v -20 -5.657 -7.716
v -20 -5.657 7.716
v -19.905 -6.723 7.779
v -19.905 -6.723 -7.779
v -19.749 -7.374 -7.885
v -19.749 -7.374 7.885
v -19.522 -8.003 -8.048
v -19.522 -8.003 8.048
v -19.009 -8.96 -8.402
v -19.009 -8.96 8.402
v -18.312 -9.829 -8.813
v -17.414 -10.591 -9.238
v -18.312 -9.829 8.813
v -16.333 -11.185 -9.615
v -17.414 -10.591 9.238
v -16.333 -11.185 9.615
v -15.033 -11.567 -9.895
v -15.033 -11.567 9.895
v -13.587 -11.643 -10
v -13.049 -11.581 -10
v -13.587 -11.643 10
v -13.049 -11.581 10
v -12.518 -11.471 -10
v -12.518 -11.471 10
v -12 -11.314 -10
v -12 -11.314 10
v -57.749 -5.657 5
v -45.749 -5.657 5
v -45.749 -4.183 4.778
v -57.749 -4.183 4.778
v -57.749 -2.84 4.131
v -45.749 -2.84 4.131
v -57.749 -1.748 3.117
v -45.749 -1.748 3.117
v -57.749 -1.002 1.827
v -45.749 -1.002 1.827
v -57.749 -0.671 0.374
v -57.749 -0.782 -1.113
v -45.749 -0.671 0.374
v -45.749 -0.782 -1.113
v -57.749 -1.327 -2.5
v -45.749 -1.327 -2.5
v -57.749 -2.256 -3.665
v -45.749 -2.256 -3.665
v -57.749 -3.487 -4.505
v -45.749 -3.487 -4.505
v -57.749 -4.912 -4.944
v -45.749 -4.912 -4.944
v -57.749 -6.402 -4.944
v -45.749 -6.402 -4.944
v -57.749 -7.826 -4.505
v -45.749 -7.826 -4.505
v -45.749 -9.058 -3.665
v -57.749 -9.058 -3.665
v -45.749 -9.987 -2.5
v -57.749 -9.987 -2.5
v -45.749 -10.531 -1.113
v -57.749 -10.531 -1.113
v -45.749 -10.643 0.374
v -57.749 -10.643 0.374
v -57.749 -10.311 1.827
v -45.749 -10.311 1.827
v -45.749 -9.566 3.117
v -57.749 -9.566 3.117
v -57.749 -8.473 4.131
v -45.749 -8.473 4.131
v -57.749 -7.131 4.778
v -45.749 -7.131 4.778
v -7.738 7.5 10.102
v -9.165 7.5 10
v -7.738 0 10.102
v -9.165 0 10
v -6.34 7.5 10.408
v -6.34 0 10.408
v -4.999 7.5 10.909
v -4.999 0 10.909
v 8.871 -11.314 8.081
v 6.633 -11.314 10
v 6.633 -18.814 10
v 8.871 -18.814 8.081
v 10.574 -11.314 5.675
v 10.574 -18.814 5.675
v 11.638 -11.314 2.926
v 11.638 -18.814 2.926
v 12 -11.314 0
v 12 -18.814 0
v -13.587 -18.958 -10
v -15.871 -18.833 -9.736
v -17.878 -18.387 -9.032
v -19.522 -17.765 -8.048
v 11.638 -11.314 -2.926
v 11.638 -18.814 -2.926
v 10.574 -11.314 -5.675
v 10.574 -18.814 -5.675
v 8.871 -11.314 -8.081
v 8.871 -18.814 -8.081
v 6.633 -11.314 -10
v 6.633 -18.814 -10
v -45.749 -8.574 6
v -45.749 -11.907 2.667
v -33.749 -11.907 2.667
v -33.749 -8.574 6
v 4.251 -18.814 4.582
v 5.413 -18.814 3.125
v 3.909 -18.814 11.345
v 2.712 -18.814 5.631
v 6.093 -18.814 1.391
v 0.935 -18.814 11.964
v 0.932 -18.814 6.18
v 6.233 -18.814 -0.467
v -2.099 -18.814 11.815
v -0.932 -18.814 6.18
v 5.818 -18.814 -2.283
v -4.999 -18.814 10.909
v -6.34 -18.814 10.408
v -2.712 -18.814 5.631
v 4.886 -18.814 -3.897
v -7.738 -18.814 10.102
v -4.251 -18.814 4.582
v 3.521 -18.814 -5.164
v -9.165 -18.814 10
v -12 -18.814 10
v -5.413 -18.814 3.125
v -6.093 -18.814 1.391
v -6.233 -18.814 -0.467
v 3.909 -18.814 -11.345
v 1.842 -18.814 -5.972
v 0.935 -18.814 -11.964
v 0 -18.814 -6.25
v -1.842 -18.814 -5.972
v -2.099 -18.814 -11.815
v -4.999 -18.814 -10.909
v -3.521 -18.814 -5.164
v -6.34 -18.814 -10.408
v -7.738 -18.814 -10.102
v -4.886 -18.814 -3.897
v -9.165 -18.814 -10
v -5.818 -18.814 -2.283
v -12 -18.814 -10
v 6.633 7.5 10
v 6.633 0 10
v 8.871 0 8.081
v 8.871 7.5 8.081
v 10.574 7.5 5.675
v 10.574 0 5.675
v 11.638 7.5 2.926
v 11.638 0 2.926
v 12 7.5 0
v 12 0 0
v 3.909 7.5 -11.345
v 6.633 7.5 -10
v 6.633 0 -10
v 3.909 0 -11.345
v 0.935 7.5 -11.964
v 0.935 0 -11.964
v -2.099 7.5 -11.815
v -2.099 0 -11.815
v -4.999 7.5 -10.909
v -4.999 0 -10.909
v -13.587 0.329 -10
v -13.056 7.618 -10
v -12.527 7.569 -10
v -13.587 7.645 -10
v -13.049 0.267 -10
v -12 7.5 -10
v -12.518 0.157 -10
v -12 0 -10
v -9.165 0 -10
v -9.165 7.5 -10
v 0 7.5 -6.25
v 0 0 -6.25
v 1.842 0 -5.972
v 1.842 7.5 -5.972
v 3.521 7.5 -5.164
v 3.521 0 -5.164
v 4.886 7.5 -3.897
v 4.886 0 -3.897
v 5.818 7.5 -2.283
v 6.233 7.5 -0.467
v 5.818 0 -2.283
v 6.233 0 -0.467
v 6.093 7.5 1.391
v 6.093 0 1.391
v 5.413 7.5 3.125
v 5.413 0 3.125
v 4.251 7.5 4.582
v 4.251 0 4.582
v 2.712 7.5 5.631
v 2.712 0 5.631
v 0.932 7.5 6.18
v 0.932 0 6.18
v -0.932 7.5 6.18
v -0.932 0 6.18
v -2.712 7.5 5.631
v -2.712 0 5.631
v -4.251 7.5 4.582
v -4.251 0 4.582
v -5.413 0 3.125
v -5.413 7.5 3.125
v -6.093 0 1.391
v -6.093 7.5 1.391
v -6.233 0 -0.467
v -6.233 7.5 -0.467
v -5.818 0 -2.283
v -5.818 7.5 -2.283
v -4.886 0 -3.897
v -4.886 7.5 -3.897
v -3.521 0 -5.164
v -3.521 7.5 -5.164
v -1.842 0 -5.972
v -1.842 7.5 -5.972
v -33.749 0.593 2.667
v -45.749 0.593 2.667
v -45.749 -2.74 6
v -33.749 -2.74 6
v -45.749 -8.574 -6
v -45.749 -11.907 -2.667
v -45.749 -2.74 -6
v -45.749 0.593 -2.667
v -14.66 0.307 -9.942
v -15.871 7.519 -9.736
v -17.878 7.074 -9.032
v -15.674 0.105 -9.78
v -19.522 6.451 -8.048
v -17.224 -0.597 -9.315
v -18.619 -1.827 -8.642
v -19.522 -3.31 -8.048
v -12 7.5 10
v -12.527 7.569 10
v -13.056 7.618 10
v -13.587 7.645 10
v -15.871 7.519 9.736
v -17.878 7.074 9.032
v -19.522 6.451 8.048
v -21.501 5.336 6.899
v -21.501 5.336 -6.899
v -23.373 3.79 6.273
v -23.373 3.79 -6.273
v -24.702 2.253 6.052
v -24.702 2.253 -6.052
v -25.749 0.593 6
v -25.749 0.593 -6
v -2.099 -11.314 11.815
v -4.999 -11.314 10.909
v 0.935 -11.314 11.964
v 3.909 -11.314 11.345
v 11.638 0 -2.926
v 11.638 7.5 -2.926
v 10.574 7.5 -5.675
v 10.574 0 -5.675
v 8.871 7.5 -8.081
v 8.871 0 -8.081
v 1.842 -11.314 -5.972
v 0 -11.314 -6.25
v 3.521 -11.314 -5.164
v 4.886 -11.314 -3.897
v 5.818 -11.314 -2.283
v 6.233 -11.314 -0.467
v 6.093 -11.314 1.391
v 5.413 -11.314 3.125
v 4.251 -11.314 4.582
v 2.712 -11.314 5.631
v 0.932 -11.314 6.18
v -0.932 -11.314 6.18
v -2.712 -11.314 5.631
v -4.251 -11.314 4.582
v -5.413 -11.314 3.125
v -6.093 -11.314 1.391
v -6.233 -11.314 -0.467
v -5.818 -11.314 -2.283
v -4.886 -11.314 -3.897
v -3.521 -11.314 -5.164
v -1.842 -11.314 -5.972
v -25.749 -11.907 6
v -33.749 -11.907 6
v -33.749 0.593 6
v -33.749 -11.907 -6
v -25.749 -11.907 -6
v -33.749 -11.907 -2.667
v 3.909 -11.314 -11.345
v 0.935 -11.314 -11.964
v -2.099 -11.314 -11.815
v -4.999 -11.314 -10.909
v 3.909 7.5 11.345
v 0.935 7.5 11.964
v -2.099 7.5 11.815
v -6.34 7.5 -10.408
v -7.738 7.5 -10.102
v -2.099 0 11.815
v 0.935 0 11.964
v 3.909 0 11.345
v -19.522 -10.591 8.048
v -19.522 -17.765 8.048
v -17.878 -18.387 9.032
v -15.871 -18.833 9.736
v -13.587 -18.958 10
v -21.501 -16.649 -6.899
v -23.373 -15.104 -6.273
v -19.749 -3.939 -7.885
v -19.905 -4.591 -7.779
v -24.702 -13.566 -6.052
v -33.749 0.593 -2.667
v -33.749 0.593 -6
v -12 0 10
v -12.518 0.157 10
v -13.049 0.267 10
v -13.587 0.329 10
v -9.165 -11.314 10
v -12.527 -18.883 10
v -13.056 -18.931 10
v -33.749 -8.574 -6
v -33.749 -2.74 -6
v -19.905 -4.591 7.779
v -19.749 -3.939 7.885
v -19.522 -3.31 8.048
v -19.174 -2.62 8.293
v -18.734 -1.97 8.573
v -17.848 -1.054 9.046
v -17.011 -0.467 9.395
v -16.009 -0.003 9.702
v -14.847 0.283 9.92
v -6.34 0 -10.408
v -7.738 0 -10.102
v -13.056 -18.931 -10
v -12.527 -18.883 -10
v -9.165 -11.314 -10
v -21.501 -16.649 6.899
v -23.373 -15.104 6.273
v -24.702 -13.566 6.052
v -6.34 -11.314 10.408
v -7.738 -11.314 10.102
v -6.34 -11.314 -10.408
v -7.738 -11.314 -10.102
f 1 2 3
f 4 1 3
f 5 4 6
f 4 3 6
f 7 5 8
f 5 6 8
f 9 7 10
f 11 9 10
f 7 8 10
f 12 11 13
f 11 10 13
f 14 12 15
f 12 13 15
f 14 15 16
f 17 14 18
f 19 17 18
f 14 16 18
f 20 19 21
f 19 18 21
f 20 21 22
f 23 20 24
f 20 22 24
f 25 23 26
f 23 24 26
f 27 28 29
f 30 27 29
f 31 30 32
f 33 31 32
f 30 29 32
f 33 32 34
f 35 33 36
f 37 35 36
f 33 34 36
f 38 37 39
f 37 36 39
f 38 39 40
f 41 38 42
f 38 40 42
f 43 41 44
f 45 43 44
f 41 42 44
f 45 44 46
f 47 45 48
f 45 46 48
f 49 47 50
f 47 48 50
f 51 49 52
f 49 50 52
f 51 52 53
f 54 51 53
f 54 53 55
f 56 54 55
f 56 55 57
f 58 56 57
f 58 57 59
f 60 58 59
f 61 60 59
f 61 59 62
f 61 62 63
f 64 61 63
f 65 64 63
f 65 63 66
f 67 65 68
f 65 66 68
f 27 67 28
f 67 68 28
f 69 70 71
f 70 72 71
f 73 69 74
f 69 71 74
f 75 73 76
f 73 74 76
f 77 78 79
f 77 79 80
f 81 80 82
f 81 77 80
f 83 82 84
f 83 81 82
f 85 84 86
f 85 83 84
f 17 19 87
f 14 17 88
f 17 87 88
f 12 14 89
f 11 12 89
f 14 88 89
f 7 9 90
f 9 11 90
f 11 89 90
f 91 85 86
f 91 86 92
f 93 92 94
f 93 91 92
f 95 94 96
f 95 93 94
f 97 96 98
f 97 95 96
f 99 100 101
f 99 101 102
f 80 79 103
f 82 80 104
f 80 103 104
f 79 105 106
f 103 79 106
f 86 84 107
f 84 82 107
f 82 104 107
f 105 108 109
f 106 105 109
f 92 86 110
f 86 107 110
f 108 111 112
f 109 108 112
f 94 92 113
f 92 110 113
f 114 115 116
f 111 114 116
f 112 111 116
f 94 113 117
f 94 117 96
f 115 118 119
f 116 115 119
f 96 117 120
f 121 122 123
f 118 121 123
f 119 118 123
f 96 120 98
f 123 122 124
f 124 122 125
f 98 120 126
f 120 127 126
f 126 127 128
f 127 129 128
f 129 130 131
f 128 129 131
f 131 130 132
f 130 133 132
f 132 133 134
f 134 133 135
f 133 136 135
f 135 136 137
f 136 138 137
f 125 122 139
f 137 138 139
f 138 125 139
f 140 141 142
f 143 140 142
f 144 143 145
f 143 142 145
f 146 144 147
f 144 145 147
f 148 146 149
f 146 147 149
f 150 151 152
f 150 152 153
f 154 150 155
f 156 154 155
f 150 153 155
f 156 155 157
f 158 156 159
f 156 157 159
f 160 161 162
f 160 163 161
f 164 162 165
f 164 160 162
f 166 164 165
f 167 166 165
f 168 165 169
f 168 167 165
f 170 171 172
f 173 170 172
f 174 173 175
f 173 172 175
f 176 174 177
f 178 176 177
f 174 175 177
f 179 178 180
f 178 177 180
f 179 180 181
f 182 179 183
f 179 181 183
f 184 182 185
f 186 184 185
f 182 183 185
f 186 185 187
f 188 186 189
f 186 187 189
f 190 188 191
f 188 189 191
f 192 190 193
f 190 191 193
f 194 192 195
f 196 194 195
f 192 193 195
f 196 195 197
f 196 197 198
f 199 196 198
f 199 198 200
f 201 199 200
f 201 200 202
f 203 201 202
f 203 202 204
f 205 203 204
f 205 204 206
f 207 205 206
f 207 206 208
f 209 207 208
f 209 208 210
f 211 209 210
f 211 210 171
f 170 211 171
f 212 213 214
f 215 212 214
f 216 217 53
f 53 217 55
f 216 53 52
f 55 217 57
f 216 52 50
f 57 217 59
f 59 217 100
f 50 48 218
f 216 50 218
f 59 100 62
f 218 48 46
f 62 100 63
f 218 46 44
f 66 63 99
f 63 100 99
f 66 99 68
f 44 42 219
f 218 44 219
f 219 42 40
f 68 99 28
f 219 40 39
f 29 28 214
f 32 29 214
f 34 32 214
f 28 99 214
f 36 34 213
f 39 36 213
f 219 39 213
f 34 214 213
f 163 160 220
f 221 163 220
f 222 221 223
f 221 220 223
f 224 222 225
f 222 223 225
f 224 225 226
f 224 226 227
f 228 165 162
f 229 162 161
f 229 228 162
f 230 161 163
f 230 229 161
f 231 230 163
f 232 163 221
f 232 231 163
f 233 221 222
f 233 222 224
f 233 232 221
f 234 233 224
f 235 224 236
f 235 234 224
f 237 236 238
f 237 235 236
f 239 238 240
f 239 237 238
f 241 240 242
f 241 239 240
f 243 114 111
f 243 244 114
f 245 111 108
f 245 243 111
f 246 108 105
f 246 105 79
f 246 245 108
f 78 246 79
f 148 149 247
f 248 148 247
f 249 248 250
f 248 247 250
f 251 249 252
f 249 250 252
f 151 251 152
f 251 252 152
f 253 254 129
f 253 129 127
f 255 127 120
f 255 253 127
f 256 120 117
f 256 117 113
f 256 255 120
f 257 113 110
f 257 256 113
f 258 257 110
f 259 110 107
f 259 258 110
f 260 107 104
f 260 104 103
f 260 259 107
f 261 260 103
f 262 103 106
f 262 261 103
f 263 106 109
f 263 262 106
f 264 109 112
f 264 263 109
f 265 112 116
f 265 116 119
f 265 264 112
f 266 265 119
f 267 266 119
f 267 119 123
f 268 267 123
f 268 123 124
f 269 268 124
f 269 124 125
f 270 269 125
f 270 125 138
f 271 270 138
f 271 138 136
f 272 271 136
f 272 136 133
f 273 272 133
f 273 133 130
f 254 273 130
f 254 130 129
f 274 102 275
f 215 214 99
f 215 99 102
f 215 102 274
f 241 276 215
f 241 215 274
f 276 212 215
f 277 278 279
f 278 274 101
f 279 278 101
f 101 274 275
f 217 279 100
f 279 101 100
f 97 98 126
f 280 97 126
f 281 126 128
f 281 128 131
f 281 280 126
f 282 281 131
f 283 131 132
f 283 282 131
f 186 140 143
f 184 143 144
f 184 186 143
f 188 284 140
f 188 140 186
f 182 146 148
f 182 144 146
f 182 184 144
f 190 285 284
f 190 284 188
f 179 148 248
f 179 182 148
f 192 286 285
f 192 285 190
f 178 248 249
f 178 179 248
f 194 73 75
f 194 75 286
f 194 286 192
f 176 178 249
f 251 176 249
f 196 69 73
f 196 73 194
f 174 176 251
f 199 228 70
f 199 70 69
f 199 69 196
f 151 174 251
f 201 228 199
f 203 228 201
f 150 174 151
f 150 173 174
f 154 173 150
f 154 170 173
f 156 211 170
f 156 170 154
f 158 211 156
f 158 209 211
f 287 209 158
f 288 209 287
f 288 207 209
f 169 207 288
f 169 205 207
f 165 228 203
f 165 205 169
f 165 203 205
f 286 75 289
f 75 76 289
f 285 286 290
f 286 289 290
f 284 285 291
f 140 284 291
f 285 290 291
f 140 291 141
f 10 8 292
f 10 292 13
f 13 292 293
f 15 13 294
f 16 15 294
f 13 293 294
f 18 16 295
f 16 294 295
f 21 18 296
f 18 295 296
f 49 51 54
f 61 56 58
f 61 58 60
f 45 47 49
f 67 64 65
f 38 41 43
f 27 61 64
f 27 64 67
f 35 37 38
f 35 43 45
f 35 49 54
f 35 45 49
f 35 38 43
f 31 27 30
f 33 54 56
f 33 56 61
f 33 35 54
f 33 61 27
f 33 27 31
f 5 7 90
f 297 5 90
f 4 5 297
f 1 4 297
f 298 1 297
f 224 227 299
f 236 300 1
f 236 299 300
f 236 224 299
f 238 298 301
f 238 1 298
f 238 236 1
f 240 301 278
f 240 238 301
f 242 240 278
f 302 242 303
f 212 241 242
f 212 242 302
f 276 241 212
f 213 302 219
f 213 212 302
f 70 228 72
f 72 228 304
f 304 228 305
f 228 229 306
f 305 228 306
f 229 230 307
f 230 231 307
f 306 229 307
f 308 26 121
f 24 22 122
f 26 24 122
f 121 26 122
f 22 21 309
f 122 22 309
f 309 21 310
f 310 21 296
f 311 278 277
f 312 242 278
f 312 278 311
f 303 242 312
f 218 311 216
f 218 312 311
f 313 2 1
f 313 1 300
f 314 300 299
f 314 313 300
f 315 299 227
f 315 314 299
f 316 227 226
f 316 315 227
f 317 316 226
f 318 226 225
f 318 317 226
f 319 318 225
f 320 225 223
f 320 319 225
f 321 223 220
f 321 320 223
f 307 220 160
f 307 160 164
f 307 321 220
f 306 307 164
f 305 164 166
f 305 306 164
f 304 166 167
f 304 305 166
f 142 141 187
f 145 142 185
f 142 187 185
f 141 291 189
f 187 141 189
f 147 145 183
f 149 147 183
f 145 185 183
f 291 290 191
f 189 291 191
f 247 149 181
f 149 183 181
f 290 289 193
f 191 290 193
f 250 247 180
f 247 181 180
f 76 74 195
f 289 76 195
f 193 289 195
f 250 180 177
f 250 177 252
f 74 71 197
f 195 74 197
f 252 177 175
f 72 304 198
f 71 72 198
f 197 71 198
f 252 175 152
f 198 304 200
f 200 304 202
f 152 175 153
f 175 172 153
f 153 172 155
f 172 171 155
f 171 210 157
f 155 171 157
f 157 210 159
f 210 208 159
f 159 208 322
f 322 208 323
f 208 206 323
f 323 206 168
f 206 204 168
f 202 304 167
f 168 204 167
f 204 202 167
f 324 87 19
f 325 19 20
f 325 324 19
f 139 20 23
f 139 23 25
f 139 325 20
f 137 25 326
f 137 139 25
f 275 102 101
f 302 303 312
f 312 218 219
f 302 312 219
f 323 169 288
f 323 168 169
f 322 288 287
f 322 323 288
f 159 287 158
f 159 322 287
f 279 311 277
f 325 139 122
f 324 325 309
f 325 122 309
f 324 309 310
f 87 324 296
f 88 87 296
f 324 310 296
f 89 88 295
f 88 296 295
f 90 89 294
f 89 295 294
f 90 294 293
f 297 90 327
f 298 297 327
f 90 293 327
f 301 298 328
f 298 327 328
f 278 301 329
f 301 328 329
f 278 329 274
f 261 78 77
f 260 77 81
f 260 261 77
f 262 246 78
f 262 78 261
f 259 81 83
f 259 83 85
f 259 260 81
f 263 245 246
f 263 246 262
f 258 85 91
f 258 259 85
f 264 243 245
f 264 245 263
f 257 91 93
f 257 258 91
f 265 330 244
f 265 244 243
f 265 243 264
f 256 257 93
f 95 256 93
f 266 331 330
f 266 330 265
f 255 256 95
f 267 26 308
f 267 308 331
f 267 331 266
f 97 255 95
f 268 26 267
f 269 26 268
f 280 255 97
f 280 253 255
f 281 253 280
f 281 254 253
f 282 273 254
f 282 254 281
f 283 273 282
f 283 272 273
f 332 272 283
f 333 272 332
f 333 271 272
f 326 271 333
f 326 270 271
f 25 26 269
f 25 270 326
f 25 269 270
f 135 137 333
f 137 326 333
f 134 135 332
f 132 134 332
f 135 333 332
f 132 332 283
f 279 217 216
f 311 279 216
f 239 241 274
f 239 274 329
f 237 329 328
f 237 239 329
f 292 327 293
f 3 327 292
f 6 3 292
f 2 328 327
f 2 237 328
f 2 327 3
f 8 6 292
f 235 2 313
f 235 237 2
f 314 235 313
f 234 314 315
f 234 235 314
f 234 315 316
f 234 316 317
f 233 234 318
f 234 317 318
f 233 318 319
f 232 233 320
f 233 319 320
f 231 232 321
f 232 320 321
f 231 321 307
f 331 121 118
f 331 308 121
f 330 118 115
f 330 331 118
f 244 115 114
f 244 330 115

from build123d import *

# Parameters (mm, degrees)
SKETCH4_R               = 12
SKETCH4_R_2             = 6.25
BOSS_EXTRUDE2_DEPTH     = 7.5
BOSS_EXTRUDE3_DEPTH     = 10
SKETCH6_R               = 6.25
CUT_EXTRUDE1_DEPTH      = 20
SKETCH7_W               = 20
SKETCH7_H               = 7.5
BOSS_EXTRUDE4_DEPTH     = 5.36675
CUT_EXTRUDE2_DEPTH      = 50.133277179
CUT_EXTRUDE2_DEPTH_BACK = 50.133277179
FILLET1_R               = 10
FILLET2_R               = 10
CUT_EXTRUDE3_DEPTH      = 12
SKETCH10_R              = 5
BOSS_EXTRUDE5_DEPTH     = 12
FILLET3_R               = 10


with BuildPart() as part:
    # Sketch4 → Boss-Extrude2 (new body)
    with BuildSketch(Plane(origin=(0, 0, 0), x_dir=(1, 0, 0), z_dir=(0, 1, 0))):
        with Locations(Location((0, 0, 0), (0, 0, 270))):
            Circle(SKETCH4_R)
        with Locations(Location((0, 0, 0), (0, 0, 270))):
            Circle(SKETCH4_R_2, mode=Mode.SUBTRACT)
    extrude(amount=BOSS_EXTRUDE2_DEPTH)

    # Sketch5 → Boss-Extrude3 (add, symmetric)
    with BuildSketch(Plane.XY):
        with BuildLine():
            Line((-25.749055866, 0.593145751), (-45.749055866, 0.593145751))
            Line((-45.749055866, 0.593145751), (-45.749055866, -5.656854249))
            Line((-45.749055866, -5.656854249), (-20, -5.656854249))
            ThreePointArc((-20, -5.656854249), (-17.464101615, -0.757874764), (-12, 0))
            Line((-12, 0), (12, 0))
            Line((12, 0), (12, 7.5))
            Line((12, 7.5), (-12, 7.5))
            ThreePointArc((-12, 7.5), (-19.973874913, 6.234976235), (-25.749055866, 0.593145751))
        make_face()
    extrude(amount=BOSS_EXTRUDE3_DEPTH, both=True)

    # Sketch6 → Cut-Extrude1 (cut)
    with BuildSketch(Plane.XZ):
        with BuildLine():
            Line((6.633249581, -10), (12, -10))
            Line((12, -10), (12, 0))
            ThreePointArc((12, 0), (10.573528147, -5.674548662), (6.633249581, -10))
        make_face()
        with BuildLine():
            ThreePointArc((6.633249581, 10), (10.573528147, 5.674548662), (12, 0))
            Line((12, 0), (12, 10))
            Line((12, 10), (6.633249581, 10))
        make_face()
        with BuildLine():
            Line((-12, -10), (-6.633249581, -10))
            ThreePointArc((-6.633249581, -10), (-10.573528147, -5.674548662), (-12, 0))
            Line((-12, 0), (-12, -10))
        make_face()
        with BuildLine():
            ThreePointArc((-12, 0), (-10.573528147, 5.674548662), (-6.633249581, 10))
            Line((-6.633249581, 10), (-12, 10))
            Line((-12, 10), (-12, 0))
        make_face()
        with Locations(Location((0, 0, 0), (0, 0, 270))):
            Circle(SKETCH6_R)
    extrude(amount=-CUT_EXTRUDE1_DEPTH, mode=Mode.SUBTRACT)


with BuildPart() as cut_extrude1_piece_1:
    # of the separate pieces the step leaves, piece 1, a body of its own (cut_extrude1_pieces)
    add(part.part.solids().sort_by_distance((-45.749055866, -5.656854249, 10))[0])



with BuildPart() as cut_extrude1_piece_2:
    # of the separate pieces the step leaves, piece 2, a body of its own (cut_extrude1_pieces)
    add(part.part.solids().sort_by_distance((-6.633249581, 0, 10))[0])


with BuildPart() as cut_extrude1_piece_1_1:
    add(cut_extrude1_piece_1.part)

    add(cut_extrude1_piece_2.part)  # Boss-Extrude4 merges Cut-Extrude1 piece 2
    # Sketch7 → Boss-Extrude4 (add)
    with BuildSketch(Plane(origin=(-12, 0, 0), x_dir=(0, 0, -1), z_dir=(1, 0, 0))):
        with Locations((0, 3.75)):
            Rectangle(SKETCH7_W, SKETCH7_H)
    extrude(amount=BOSS_EXTRUDE4_DEPTH)

    # Mirror2: Cut-Extrude1 piece 1 across plane


with BuildPart() as cut_extrude1_piece_1_2:
    add(cut_extrude1_piece_1_1.part)
    add(cut_extrude1_piece_1_1.part.mirror(Plane(origin=(-45.749055866, -5.656854249, 10), x_dir=(0, 0, 1), z_dir=(0, 1, 0))))

    # Sketch8 → Cut-Extrude2 (cut, two sides: drawn at the far end of the back side and taken through both)
    with BuildSketch(Plane(origin=(0, -5.656854249, 0), x_dir=(-1, 0, 0), z_dir=(0, -1, 0)).offset(-CUT_EXTRUDE2_DEPTH_BACK)):
        with BuildLine():
            ThreePointArc((17.507339718, 10), (21.168502268, 7.052829994), (25.749055866, 6))
            Line((25.749055866, 6), (45.749055866, 6))
            Line((45.749055866, 6), (45.749055866, 10))
            Line((45.749055866, 10), (17.507339718, 10))
        make_face()
        with BuildLine():
            Line((45.749055866, -10), (45.749055866, -6))
            Line((45.749055866, -6), (25.749055866, -6))
            ThreePointArc((25.749055866, -6), (21.168502268, -7.052829994), (17.507339718, -10))
            Line((17.507339718, -10), (45.749055866, -10))
        make_face()
    extrude(amount=CUT_EXTRUDE2_DEPTH + CUT_EXTRUDE2_DEPTH_BACK, mode=Mode.SUBTRACT)

    # Fillet1
    # the kernel refuses this fillet: 10 mm, written as the material it takes off along each edge
    with BuildSketch(Plane(origin=(-17.507339718, -28.296259364, -10), x_dir=(1, 0, 0), z_dir=(0, 1, 0)), Plane(origin=(-17.507339718, -10.590642804, -10), x_dir=(1, 0, 0), z_dir=(0, 1, 0))) as fillet1_piece_1:
        with BuildLine():
            CenterArc((3.920762426, -10), FILLET1_R, 90, 36.410037128)
            ThreePointArc((-2.014836369, -1.952101707), (-0.941870787, -1.043704746), (0, 0))
            Line((0, 0), (3.920762426, 0))
        make_face()
    extrude(amount=27.573193669, mode=Mode.SUBTRACT)

    # Fillet2
    # the kernel refuses this fillet: 10 mm, written as the material it takes off along each edge
    with BuildSketch(Plane(origin=(-17.507339718, -10.590642804, 10), x_dir=(-0.718199432618455, 0, -0.6958373193401812), z_dir=(0, 1, 0))) as fillet2_piece_1:
        with BuildLine():
            CenterArc((4.142483844, -9.910207143), FILLET2_R, 97.683941218, 36.410037128)
            Line((-2.81588935, -2.728212816), (0, 0))
            ThreePointArc((0, 0), (1.402699778, -0.094199313), (2.805399556, 0))
        make_face()
    extrude(amount=27.573193669, mode=Mode.SUBTRACT)
    with BuildSketch(Plane(origin=(-17.507339718, -28.296259364, 10), x_dir=(1, 0, 0), z_dir=(0, 1, 0))) as fillet2_piece_2:
        with BuildLine():
            CenterArc((3.920762426, 10), FILLET2_R, 233.589962872, 36.410037128)
            ThreePointArc((-2.014836369, 1.952101707), (-0.941870787, 1.043704746), (0, 0))
            Line((0, 0), (3.920762426, 0))
        make_face()
    extrude(amount=27.573193669, mode=Mode.SUBTRACT)

    # Sketch9 → Cut-Extrude3 (cut)
    with BuildSketch(Plane.ZY.offset(45.749055866)):
        Polygon((-6, -2.740187583), (-2.666666667, 0.593145751), (-6, 0.593145751), align=None)
        Polygon((6, 0.593145751), (2.666666667, 0.593145751), (6, -2.740187583), align=None)
        Polygon((6, -8.573520916), (6, -11.906854249), (2.666666667, -11.906854249), align=None)
        Polygon((-6, -8.573520916), (-6, -11.906854249), (-2.666666667, -11.906854249), align=None)
    extrude(amount=-CUT_EXTRUDE3_DEPTH, mode=Mode.SUBTRACT)

    # Sketch10 → Boss-Extrude5 (add)
    with BuildSketch(Plane.ZY.offset(45.749055866)):
        with Locations((0, -5.656854249)):
            Circle(SKETCH10_R)
    extrude(amount=BOSS_EXTRUDE5_DEPTH)

    # Fillet3
    fillet3_edges = [cut_extrude1_piece_1_2.edges().sort_by_distance(p)[0] for p in [
        (-6.633249581, 3.75, 10),
        (-6.633249581, 3.75, -10),
        (-6.633249581, -15.063708499, -10),
        (-6.633249581, -15.063708499, 10),
    ]]
    fillet(fillet3_edges, radius=FILLET3_R)


solid = cut_extrude1_piece_1_2.part
